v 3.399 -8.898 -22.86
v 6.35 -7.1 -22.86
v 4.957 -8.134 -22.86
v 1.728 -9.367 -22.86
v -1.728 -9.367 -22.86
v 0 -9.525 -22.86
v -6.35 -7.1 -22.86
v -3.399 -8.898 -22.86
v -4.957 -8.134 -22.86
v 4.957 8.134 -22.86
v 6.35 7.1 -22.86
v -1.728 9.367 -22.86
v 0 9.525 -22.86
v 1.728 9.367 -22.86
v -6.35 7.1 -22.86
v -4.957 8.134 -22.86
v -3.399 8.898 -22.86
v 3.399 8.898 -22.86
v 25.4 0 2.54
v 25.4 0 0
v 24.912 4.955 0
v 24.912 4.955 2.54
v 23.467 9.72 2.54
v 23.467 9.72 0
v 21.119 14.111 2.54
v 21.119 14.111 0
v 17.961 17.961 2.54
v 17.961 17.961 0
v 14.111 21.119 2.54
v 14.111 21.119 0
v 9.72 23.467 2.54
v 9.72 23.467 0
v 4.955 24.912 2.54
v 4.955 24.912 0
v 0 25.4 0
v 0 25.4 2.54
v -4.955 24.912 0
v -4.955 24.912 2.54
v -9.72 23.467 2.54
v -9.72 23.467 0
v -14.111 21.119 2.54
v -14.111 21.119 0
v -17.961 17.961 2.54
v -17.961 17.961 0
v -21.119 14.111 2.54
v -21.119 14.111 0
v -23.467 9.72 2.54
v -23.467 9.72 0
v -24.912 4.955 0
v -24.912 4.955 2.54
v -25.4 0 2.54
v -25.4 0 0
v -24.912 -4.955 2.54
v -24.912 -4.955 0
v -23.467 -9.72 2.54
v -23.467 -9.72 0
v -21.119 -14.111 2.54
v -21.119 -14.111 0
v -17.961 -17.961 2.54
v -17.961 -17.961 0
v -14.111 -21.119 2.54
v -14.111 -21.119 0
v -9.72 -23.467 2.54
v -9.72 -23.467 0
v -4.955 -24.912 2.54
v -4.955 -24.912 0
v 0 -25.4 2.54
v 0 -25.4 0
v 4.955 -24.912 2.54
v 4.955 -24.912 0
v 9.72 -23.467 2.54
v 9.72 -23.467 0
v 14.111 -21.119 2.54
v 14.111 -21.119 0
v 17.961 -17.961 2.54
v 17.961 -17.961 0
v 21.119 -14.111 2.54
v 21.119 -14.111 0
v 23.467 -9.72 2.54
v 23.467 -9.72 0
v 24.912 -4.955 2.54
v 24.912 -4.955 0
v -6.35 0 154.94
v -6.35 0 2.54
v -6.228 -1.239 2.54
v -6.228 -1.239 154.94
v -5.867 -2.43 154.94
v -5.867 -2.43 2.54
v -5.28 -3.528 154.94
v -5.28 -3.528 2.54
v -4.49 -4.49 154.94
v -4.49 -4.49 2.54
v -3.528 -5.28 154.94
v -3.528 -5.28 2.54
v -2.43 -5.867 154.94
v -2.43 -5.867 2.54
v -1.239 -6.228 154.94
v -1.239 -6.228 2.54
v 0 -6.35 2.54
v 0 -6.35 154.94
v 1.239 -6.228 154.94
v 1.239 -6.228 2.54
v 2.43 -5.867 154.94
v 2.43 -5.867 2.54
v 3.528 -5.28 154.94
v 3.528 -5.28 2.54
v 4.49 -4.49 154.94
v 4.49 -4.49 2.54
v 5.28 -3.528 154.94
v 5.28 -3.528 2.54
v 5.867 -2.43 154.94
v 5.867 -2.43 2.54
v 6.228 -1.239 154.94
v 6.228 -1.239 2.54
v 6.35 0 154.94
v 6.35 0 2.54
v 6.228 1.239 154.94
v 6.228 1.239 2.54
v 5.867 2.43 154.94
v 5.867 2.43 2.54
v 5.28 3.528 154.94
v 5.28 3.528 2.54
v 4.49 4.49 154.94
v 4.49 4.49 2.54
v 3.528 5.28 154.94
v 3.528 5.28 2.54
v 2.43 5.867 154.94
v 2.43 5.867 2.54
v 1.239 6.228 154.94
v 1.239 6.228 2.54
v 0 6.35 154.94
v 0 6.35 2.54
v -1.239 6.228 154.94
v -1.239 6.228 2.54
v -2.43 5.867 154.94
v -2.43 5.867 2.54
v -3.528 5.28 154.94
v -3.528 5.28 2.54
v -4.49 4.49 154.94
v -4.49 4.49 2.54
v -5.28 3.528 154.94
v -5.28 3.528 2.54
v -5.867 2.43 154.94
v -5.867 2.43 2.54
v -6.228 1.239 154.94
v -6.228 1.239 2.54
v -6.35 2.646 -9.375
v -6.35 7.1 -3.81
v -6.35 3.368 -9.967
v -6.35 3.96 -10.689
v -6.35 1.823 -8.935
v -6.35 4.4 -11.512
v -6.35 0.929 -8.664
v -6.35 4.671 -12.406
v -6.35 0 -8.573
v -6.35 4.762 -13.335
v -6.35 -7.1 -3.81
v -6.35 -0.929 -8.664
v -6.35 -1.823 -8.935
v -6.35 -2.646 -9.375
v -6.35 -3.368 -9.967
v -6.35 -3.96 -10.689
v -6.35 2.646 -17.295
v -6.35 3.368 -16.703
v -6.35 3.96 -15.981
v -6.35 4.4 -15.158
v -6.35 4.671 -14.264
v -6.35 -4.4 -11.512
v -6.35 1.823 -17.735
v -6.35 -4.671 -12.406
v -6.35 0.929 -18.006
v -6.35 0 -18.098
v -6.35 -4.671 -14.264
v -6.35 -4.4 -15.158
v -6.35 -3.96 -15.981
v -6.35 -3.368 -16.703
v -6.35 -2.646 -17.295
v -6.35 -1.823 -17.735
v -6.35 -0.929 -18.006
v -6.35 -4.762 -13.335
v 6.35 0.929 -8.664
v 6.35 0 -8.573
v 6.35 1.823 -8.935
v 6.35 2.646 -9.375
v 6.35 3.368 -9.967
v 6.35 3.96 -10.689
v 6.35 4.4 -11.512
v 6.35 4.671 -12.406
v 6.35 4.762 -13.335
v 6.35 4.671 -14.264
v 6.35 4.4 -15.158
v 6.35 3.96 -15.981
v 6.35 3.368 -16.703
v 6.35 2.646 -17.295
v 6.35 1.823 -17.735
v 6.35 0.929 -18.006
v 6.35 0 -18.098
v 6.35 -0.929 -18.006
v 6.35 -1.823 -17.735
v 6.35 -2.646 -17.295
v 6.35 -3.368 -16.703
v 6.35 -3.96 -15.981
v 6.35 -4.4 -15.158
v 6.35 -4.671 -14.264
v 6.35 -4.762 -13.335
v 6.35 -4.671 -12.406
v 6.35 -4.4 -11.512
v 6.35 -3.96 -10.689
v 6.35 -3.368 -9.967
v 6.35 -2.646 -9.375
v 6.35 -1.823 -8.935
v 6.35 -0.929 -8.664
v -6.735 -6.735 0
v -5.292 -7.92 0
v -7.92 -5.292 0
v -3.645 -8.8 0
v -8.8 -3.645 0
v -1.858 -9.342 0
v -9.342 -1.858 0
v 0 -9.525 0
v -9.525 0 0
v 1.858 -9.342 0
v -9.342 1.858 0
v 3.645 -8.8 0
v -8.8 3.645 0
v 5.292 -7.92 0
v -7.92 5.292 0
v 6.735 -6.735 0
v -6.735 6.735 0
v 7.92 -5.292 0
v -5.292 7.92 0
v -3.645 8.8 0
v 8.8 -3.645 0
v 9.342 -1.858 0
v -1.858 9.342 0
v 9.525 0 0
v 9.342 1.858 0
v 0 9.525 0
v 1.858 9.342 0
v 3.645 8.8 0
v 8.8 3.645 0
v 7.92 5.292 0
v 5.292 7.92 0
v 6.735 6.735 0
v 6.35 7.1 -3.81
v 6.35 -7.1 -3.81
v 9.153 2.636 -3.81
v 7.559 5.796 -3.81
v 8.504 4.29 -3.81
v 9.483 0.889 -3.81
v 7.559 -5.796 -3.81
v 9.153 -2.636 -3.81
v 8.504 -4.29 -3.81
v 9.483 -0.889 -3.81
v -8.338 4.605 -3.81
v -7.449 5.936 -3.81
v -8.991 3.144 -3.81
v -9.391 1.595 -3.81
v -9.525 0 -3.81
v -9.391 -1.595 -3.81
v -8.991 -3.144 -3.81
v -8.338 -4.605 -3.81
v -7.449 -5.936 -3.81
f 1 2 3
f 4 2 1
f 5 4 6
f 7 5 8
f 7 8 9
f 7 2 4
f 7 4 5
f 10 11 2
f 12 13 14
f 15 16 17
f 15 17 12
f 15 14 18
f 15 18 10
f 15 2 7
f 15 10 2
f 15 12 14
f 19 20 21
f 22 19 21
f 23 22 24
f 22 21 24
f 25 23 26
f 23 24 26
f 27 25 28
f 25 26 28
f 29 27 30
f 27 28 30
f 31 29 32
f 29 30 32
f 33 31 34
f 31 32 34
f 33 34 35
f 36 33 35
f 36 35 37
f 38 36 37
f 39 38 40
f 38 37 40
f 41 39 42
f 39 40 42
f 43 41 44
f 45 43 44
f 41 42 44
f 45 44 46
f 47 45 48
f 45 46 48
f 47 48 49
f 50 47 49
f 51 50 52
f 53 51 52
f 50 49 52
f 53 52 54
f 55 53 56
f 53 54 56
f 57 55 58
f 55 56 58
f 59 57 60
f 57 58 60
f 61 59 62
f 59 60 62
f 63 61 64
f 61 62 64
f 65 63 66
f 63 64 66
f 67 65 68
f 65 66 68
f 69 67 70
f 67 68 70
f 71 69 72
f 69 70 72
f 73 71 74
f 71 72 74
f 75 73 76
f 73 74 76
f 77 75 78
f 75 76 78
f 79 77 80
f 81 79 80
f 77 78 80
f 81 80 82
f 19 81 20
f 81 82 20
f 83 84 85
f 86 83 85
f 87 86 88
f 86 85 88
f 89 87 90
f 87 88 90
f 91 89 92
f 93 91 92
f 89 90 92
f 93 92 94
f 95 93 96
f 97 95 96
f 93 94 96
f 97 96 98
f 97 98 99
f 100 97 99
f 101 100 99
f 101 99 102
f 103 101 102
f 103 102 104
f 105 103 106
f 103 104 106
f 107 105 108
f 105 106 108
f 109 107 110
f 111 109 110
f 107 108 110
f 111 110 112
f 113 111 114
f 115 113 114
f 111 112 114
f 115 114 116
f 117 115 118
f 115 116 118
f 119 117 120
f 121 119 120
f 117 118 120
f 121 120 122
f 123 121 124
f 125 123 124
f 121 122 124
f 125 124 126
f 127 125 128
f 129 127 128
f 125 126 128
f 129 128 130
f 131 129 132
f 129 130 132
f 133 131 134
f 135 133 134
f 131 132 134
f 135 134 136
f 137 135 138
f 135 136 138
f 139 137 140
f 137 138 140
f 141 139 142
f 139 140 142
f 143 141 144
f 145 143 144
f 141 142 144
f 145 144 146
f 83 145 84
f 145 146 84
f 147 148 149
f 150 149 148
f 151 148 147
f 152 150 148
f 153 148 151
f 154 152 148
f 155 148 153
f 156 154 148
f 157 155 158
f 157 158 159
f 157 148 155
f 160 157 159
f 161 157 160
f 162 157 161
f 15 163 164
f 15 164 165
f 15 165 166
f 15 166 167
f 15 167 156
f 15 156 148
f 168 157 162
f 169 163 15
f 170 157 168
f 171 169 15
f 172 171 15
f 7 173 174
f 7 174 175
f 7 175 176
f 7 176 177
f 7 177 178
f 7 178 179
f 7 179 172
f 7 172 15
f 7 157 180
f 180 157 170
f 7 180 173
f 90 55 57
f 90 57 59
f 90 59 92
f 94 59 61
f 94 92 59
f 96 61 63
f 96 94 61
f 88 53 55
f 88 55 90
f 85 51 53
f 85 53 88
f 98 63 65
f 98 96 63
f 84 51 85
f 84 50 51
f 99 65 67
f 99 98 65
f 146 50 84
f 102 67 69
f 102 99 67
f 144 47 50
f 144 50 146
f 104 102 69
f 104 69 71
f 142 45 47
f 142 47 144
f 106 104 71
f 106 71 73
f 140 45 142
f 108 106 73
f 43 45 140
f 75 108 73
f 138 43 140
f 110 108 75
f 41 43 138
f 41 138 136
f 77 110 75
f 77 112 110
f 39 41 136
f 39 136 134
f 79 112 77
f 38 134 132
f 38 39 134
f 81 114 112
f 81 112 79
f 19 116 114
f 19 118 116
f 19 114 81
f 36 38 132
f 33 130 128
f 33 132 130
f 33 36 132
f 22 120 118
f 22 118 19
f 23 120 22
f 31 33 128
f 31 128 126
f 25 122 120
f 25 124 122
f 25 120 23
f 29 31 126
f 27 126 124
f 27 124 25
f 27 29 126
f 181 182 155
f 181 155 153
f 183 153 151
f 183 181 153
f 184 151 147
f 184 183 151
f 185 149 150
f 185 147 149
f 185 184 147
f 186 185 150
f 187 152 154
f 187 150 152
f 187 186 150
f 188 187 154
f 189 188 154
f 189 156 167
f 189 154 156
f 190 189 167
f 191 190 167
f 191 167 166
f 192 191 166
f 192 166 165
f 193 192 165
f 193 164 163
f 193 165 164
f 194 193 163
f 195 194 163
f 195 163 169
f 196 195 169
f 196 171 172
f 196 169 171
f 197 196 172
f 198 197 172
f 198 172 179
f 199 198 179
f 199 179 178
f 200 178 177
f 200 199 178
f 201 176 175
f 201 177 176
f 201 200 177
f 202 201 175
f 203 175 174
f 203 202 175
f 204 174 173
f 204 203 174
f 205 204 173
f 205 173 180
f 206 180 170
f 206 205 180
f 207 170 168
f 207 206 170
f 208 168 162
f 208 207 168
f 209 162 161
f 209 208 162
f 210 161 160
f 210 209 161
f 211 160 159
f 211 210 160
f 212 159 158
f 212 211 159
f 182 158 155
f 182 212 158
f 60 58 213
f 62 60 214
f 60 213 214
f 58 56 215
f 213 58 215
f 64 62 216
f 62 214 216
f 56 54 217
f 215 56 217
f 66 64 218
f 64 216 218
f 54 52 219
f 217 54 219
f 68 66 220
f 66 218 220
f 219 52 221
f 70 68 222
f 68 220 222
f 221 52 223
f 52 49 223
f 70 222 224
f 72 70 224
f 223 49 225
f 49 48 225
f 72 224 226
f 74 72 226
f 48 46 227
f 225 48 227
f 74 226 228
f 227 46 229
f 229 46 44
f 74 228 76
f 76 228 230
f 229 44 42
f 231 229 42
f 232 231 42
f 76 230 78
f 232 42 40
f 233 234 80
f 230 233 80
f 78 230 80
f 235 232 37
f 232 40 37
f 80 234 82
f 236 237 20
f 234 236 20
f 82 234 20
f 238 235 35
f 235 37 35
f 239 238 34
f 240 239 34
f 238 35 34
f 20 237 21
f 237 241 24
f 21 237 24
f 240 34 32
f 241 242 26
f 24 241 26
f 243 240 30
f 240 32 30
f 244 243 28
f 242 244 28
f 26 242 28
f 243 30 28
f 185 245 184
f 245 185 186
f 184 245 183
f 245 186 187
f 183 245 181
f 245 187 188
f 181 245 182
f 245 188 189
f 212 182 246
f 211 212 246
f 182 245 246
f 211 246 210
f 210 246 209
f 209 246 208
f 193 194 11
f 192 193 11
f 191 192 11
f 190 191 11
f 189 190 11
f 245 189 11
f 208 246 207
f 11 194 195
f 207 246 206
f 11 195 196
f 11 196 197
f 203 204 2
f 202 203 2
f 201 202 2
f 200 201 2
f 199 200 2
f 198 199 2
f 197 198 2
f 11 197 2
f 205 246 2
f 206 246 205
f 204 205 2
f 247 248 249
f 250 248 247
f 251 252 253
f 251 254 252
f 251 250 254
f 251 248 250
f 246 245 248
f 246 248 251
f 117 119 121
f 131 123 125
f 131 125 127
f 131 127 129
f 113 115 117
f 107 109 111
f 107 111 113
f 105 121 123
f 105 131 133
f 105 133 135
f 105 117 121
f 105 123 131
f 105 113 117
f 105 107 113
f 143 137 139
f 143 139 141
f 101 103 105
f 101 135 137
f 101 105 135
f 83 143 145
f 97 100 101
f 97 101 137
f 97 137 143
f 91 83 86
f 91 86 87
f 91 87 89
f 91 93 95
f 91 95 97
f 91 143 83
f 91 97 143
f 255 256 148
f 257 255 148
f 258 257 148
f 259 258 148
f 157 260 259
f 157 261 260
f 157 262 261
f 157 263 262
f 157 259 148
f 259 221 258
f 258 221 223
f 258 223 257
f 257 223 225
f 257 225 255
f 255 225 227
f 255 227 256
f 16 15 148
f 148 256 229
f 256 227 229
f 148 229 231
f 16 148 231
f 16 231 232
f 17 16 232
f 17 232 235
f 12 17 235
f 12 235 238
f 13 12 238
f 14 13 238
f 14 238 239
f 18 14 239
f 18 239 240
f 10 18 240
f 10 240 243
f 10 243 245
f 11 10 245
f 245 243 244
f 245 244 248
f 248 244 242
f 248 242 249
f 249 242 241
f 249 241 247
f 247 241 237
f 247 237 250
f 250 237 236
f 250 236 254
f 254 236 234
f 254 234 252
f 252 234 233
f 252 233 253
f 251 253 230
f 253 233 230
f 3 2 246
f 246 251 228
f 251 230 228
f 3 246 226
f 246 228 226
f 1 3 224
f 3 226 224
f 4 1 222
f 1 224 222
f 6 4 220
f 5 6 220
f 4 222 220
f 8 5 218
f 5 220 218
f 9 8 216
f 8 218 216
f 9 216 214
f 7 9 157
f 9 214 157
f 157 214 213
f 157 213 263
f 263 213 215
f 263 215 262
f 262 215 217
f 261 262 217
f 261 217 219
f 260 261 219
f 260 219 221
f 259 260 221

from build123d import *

# Parameters (mm, degrees)
SKETCH1_R               = 25.4
BOSS_EXTRUDE1_DEPTH     = 2.54
SKETCH2_R               = 6.35
BOSS_EXTRUDE2_DEPTH     = 152.4
SKETCH3_R               = 9.525
BOSS_EXTRUDE3_DEPTH     = 22.86
CUT_EXTRUDE2_DEPTH      = 160.049437597
CUT_EXTRUDE2_DEPTH_BACK = 160.049437597
SKETCH4_W               = 3.175
SKETCH4_H               = 19.05
CUT_EXTRUDE3_DEPTH      = 161.18622319
CUT_EXTRUDE3_DEPTH_BACK = 161.18622319
SKETCH5_R               = 4.7625


with BuildPart() as part:
    # Sketch1 → Boss-Extrude1 (new body)
    with BuildSketch(Plane.XY):
        Circle(SKETCH1_R)
    extrude(amount=BOSS_EXTRUDE1_DEPTH)

    # Sketch2 → Boss-Extrude2 (add)
    with BuildSketch(Plane.XY.offset(2.54)):
        with Locations(Location((0, 0, 0), (0, 0, 180))):
            Circle(SKETCH2_R)
    extrude(amount=BOSS_EXTRUDE2_DEPTH)

    # Sketch3 → Boss-Extrude3 (add)
    with BuildSketch(Plane(origin=(0, 0, 0), x_dir=(-1, 0, 0), z_dir=(0, 0, -1))):
        Circle(SKETCH3_R)
    extrude(amount=BOSS_EXTRUDE3_DEPTH)

    # Sketch4 → Cut-Extrude2 (cut, two sides: drawn at the far end of the back side and taken through both)
    with BuildSketch(Plane(origin=(0, 0, 0), x_dir=(1, 0, 0), z_dir=(0, 1, 0)).offset(-CUT_EXTRUDE2_DEPTH_BACK)):
        with Locations((7.9375, 13.335)):
            Rectangle(SKETCH4_W, SKETCH4_H)
        with Locations((-7.9375, 13.335)):
            Rectangle(SKETCH4_W, SKETCH4_H)
    extrude(amount=CUT_EXTRUDE2_DEPTH + CUT_EXTRUDE2_DEPTH_BACK, mode=Mode.SUBTRACT)

    # Sketch5 → Cut-Extrude3 (cut, two sides: drawn at the far end of the back side and taken through both)
    with BuildSketch(Plane.ZY.offset(6.35).offset(-CUT_EXTRUDE3_DEPTH_BACK)):
        with Locations((-13.335, 0)):
            Circle(SKETCH5_R)
    extrude(amount=CUT_EXTRUDE3_DEPTH + CUT_EXTRUDE3_DEPTH_BACK, mode=Mode.SUBTRACT)


solid = part.part
